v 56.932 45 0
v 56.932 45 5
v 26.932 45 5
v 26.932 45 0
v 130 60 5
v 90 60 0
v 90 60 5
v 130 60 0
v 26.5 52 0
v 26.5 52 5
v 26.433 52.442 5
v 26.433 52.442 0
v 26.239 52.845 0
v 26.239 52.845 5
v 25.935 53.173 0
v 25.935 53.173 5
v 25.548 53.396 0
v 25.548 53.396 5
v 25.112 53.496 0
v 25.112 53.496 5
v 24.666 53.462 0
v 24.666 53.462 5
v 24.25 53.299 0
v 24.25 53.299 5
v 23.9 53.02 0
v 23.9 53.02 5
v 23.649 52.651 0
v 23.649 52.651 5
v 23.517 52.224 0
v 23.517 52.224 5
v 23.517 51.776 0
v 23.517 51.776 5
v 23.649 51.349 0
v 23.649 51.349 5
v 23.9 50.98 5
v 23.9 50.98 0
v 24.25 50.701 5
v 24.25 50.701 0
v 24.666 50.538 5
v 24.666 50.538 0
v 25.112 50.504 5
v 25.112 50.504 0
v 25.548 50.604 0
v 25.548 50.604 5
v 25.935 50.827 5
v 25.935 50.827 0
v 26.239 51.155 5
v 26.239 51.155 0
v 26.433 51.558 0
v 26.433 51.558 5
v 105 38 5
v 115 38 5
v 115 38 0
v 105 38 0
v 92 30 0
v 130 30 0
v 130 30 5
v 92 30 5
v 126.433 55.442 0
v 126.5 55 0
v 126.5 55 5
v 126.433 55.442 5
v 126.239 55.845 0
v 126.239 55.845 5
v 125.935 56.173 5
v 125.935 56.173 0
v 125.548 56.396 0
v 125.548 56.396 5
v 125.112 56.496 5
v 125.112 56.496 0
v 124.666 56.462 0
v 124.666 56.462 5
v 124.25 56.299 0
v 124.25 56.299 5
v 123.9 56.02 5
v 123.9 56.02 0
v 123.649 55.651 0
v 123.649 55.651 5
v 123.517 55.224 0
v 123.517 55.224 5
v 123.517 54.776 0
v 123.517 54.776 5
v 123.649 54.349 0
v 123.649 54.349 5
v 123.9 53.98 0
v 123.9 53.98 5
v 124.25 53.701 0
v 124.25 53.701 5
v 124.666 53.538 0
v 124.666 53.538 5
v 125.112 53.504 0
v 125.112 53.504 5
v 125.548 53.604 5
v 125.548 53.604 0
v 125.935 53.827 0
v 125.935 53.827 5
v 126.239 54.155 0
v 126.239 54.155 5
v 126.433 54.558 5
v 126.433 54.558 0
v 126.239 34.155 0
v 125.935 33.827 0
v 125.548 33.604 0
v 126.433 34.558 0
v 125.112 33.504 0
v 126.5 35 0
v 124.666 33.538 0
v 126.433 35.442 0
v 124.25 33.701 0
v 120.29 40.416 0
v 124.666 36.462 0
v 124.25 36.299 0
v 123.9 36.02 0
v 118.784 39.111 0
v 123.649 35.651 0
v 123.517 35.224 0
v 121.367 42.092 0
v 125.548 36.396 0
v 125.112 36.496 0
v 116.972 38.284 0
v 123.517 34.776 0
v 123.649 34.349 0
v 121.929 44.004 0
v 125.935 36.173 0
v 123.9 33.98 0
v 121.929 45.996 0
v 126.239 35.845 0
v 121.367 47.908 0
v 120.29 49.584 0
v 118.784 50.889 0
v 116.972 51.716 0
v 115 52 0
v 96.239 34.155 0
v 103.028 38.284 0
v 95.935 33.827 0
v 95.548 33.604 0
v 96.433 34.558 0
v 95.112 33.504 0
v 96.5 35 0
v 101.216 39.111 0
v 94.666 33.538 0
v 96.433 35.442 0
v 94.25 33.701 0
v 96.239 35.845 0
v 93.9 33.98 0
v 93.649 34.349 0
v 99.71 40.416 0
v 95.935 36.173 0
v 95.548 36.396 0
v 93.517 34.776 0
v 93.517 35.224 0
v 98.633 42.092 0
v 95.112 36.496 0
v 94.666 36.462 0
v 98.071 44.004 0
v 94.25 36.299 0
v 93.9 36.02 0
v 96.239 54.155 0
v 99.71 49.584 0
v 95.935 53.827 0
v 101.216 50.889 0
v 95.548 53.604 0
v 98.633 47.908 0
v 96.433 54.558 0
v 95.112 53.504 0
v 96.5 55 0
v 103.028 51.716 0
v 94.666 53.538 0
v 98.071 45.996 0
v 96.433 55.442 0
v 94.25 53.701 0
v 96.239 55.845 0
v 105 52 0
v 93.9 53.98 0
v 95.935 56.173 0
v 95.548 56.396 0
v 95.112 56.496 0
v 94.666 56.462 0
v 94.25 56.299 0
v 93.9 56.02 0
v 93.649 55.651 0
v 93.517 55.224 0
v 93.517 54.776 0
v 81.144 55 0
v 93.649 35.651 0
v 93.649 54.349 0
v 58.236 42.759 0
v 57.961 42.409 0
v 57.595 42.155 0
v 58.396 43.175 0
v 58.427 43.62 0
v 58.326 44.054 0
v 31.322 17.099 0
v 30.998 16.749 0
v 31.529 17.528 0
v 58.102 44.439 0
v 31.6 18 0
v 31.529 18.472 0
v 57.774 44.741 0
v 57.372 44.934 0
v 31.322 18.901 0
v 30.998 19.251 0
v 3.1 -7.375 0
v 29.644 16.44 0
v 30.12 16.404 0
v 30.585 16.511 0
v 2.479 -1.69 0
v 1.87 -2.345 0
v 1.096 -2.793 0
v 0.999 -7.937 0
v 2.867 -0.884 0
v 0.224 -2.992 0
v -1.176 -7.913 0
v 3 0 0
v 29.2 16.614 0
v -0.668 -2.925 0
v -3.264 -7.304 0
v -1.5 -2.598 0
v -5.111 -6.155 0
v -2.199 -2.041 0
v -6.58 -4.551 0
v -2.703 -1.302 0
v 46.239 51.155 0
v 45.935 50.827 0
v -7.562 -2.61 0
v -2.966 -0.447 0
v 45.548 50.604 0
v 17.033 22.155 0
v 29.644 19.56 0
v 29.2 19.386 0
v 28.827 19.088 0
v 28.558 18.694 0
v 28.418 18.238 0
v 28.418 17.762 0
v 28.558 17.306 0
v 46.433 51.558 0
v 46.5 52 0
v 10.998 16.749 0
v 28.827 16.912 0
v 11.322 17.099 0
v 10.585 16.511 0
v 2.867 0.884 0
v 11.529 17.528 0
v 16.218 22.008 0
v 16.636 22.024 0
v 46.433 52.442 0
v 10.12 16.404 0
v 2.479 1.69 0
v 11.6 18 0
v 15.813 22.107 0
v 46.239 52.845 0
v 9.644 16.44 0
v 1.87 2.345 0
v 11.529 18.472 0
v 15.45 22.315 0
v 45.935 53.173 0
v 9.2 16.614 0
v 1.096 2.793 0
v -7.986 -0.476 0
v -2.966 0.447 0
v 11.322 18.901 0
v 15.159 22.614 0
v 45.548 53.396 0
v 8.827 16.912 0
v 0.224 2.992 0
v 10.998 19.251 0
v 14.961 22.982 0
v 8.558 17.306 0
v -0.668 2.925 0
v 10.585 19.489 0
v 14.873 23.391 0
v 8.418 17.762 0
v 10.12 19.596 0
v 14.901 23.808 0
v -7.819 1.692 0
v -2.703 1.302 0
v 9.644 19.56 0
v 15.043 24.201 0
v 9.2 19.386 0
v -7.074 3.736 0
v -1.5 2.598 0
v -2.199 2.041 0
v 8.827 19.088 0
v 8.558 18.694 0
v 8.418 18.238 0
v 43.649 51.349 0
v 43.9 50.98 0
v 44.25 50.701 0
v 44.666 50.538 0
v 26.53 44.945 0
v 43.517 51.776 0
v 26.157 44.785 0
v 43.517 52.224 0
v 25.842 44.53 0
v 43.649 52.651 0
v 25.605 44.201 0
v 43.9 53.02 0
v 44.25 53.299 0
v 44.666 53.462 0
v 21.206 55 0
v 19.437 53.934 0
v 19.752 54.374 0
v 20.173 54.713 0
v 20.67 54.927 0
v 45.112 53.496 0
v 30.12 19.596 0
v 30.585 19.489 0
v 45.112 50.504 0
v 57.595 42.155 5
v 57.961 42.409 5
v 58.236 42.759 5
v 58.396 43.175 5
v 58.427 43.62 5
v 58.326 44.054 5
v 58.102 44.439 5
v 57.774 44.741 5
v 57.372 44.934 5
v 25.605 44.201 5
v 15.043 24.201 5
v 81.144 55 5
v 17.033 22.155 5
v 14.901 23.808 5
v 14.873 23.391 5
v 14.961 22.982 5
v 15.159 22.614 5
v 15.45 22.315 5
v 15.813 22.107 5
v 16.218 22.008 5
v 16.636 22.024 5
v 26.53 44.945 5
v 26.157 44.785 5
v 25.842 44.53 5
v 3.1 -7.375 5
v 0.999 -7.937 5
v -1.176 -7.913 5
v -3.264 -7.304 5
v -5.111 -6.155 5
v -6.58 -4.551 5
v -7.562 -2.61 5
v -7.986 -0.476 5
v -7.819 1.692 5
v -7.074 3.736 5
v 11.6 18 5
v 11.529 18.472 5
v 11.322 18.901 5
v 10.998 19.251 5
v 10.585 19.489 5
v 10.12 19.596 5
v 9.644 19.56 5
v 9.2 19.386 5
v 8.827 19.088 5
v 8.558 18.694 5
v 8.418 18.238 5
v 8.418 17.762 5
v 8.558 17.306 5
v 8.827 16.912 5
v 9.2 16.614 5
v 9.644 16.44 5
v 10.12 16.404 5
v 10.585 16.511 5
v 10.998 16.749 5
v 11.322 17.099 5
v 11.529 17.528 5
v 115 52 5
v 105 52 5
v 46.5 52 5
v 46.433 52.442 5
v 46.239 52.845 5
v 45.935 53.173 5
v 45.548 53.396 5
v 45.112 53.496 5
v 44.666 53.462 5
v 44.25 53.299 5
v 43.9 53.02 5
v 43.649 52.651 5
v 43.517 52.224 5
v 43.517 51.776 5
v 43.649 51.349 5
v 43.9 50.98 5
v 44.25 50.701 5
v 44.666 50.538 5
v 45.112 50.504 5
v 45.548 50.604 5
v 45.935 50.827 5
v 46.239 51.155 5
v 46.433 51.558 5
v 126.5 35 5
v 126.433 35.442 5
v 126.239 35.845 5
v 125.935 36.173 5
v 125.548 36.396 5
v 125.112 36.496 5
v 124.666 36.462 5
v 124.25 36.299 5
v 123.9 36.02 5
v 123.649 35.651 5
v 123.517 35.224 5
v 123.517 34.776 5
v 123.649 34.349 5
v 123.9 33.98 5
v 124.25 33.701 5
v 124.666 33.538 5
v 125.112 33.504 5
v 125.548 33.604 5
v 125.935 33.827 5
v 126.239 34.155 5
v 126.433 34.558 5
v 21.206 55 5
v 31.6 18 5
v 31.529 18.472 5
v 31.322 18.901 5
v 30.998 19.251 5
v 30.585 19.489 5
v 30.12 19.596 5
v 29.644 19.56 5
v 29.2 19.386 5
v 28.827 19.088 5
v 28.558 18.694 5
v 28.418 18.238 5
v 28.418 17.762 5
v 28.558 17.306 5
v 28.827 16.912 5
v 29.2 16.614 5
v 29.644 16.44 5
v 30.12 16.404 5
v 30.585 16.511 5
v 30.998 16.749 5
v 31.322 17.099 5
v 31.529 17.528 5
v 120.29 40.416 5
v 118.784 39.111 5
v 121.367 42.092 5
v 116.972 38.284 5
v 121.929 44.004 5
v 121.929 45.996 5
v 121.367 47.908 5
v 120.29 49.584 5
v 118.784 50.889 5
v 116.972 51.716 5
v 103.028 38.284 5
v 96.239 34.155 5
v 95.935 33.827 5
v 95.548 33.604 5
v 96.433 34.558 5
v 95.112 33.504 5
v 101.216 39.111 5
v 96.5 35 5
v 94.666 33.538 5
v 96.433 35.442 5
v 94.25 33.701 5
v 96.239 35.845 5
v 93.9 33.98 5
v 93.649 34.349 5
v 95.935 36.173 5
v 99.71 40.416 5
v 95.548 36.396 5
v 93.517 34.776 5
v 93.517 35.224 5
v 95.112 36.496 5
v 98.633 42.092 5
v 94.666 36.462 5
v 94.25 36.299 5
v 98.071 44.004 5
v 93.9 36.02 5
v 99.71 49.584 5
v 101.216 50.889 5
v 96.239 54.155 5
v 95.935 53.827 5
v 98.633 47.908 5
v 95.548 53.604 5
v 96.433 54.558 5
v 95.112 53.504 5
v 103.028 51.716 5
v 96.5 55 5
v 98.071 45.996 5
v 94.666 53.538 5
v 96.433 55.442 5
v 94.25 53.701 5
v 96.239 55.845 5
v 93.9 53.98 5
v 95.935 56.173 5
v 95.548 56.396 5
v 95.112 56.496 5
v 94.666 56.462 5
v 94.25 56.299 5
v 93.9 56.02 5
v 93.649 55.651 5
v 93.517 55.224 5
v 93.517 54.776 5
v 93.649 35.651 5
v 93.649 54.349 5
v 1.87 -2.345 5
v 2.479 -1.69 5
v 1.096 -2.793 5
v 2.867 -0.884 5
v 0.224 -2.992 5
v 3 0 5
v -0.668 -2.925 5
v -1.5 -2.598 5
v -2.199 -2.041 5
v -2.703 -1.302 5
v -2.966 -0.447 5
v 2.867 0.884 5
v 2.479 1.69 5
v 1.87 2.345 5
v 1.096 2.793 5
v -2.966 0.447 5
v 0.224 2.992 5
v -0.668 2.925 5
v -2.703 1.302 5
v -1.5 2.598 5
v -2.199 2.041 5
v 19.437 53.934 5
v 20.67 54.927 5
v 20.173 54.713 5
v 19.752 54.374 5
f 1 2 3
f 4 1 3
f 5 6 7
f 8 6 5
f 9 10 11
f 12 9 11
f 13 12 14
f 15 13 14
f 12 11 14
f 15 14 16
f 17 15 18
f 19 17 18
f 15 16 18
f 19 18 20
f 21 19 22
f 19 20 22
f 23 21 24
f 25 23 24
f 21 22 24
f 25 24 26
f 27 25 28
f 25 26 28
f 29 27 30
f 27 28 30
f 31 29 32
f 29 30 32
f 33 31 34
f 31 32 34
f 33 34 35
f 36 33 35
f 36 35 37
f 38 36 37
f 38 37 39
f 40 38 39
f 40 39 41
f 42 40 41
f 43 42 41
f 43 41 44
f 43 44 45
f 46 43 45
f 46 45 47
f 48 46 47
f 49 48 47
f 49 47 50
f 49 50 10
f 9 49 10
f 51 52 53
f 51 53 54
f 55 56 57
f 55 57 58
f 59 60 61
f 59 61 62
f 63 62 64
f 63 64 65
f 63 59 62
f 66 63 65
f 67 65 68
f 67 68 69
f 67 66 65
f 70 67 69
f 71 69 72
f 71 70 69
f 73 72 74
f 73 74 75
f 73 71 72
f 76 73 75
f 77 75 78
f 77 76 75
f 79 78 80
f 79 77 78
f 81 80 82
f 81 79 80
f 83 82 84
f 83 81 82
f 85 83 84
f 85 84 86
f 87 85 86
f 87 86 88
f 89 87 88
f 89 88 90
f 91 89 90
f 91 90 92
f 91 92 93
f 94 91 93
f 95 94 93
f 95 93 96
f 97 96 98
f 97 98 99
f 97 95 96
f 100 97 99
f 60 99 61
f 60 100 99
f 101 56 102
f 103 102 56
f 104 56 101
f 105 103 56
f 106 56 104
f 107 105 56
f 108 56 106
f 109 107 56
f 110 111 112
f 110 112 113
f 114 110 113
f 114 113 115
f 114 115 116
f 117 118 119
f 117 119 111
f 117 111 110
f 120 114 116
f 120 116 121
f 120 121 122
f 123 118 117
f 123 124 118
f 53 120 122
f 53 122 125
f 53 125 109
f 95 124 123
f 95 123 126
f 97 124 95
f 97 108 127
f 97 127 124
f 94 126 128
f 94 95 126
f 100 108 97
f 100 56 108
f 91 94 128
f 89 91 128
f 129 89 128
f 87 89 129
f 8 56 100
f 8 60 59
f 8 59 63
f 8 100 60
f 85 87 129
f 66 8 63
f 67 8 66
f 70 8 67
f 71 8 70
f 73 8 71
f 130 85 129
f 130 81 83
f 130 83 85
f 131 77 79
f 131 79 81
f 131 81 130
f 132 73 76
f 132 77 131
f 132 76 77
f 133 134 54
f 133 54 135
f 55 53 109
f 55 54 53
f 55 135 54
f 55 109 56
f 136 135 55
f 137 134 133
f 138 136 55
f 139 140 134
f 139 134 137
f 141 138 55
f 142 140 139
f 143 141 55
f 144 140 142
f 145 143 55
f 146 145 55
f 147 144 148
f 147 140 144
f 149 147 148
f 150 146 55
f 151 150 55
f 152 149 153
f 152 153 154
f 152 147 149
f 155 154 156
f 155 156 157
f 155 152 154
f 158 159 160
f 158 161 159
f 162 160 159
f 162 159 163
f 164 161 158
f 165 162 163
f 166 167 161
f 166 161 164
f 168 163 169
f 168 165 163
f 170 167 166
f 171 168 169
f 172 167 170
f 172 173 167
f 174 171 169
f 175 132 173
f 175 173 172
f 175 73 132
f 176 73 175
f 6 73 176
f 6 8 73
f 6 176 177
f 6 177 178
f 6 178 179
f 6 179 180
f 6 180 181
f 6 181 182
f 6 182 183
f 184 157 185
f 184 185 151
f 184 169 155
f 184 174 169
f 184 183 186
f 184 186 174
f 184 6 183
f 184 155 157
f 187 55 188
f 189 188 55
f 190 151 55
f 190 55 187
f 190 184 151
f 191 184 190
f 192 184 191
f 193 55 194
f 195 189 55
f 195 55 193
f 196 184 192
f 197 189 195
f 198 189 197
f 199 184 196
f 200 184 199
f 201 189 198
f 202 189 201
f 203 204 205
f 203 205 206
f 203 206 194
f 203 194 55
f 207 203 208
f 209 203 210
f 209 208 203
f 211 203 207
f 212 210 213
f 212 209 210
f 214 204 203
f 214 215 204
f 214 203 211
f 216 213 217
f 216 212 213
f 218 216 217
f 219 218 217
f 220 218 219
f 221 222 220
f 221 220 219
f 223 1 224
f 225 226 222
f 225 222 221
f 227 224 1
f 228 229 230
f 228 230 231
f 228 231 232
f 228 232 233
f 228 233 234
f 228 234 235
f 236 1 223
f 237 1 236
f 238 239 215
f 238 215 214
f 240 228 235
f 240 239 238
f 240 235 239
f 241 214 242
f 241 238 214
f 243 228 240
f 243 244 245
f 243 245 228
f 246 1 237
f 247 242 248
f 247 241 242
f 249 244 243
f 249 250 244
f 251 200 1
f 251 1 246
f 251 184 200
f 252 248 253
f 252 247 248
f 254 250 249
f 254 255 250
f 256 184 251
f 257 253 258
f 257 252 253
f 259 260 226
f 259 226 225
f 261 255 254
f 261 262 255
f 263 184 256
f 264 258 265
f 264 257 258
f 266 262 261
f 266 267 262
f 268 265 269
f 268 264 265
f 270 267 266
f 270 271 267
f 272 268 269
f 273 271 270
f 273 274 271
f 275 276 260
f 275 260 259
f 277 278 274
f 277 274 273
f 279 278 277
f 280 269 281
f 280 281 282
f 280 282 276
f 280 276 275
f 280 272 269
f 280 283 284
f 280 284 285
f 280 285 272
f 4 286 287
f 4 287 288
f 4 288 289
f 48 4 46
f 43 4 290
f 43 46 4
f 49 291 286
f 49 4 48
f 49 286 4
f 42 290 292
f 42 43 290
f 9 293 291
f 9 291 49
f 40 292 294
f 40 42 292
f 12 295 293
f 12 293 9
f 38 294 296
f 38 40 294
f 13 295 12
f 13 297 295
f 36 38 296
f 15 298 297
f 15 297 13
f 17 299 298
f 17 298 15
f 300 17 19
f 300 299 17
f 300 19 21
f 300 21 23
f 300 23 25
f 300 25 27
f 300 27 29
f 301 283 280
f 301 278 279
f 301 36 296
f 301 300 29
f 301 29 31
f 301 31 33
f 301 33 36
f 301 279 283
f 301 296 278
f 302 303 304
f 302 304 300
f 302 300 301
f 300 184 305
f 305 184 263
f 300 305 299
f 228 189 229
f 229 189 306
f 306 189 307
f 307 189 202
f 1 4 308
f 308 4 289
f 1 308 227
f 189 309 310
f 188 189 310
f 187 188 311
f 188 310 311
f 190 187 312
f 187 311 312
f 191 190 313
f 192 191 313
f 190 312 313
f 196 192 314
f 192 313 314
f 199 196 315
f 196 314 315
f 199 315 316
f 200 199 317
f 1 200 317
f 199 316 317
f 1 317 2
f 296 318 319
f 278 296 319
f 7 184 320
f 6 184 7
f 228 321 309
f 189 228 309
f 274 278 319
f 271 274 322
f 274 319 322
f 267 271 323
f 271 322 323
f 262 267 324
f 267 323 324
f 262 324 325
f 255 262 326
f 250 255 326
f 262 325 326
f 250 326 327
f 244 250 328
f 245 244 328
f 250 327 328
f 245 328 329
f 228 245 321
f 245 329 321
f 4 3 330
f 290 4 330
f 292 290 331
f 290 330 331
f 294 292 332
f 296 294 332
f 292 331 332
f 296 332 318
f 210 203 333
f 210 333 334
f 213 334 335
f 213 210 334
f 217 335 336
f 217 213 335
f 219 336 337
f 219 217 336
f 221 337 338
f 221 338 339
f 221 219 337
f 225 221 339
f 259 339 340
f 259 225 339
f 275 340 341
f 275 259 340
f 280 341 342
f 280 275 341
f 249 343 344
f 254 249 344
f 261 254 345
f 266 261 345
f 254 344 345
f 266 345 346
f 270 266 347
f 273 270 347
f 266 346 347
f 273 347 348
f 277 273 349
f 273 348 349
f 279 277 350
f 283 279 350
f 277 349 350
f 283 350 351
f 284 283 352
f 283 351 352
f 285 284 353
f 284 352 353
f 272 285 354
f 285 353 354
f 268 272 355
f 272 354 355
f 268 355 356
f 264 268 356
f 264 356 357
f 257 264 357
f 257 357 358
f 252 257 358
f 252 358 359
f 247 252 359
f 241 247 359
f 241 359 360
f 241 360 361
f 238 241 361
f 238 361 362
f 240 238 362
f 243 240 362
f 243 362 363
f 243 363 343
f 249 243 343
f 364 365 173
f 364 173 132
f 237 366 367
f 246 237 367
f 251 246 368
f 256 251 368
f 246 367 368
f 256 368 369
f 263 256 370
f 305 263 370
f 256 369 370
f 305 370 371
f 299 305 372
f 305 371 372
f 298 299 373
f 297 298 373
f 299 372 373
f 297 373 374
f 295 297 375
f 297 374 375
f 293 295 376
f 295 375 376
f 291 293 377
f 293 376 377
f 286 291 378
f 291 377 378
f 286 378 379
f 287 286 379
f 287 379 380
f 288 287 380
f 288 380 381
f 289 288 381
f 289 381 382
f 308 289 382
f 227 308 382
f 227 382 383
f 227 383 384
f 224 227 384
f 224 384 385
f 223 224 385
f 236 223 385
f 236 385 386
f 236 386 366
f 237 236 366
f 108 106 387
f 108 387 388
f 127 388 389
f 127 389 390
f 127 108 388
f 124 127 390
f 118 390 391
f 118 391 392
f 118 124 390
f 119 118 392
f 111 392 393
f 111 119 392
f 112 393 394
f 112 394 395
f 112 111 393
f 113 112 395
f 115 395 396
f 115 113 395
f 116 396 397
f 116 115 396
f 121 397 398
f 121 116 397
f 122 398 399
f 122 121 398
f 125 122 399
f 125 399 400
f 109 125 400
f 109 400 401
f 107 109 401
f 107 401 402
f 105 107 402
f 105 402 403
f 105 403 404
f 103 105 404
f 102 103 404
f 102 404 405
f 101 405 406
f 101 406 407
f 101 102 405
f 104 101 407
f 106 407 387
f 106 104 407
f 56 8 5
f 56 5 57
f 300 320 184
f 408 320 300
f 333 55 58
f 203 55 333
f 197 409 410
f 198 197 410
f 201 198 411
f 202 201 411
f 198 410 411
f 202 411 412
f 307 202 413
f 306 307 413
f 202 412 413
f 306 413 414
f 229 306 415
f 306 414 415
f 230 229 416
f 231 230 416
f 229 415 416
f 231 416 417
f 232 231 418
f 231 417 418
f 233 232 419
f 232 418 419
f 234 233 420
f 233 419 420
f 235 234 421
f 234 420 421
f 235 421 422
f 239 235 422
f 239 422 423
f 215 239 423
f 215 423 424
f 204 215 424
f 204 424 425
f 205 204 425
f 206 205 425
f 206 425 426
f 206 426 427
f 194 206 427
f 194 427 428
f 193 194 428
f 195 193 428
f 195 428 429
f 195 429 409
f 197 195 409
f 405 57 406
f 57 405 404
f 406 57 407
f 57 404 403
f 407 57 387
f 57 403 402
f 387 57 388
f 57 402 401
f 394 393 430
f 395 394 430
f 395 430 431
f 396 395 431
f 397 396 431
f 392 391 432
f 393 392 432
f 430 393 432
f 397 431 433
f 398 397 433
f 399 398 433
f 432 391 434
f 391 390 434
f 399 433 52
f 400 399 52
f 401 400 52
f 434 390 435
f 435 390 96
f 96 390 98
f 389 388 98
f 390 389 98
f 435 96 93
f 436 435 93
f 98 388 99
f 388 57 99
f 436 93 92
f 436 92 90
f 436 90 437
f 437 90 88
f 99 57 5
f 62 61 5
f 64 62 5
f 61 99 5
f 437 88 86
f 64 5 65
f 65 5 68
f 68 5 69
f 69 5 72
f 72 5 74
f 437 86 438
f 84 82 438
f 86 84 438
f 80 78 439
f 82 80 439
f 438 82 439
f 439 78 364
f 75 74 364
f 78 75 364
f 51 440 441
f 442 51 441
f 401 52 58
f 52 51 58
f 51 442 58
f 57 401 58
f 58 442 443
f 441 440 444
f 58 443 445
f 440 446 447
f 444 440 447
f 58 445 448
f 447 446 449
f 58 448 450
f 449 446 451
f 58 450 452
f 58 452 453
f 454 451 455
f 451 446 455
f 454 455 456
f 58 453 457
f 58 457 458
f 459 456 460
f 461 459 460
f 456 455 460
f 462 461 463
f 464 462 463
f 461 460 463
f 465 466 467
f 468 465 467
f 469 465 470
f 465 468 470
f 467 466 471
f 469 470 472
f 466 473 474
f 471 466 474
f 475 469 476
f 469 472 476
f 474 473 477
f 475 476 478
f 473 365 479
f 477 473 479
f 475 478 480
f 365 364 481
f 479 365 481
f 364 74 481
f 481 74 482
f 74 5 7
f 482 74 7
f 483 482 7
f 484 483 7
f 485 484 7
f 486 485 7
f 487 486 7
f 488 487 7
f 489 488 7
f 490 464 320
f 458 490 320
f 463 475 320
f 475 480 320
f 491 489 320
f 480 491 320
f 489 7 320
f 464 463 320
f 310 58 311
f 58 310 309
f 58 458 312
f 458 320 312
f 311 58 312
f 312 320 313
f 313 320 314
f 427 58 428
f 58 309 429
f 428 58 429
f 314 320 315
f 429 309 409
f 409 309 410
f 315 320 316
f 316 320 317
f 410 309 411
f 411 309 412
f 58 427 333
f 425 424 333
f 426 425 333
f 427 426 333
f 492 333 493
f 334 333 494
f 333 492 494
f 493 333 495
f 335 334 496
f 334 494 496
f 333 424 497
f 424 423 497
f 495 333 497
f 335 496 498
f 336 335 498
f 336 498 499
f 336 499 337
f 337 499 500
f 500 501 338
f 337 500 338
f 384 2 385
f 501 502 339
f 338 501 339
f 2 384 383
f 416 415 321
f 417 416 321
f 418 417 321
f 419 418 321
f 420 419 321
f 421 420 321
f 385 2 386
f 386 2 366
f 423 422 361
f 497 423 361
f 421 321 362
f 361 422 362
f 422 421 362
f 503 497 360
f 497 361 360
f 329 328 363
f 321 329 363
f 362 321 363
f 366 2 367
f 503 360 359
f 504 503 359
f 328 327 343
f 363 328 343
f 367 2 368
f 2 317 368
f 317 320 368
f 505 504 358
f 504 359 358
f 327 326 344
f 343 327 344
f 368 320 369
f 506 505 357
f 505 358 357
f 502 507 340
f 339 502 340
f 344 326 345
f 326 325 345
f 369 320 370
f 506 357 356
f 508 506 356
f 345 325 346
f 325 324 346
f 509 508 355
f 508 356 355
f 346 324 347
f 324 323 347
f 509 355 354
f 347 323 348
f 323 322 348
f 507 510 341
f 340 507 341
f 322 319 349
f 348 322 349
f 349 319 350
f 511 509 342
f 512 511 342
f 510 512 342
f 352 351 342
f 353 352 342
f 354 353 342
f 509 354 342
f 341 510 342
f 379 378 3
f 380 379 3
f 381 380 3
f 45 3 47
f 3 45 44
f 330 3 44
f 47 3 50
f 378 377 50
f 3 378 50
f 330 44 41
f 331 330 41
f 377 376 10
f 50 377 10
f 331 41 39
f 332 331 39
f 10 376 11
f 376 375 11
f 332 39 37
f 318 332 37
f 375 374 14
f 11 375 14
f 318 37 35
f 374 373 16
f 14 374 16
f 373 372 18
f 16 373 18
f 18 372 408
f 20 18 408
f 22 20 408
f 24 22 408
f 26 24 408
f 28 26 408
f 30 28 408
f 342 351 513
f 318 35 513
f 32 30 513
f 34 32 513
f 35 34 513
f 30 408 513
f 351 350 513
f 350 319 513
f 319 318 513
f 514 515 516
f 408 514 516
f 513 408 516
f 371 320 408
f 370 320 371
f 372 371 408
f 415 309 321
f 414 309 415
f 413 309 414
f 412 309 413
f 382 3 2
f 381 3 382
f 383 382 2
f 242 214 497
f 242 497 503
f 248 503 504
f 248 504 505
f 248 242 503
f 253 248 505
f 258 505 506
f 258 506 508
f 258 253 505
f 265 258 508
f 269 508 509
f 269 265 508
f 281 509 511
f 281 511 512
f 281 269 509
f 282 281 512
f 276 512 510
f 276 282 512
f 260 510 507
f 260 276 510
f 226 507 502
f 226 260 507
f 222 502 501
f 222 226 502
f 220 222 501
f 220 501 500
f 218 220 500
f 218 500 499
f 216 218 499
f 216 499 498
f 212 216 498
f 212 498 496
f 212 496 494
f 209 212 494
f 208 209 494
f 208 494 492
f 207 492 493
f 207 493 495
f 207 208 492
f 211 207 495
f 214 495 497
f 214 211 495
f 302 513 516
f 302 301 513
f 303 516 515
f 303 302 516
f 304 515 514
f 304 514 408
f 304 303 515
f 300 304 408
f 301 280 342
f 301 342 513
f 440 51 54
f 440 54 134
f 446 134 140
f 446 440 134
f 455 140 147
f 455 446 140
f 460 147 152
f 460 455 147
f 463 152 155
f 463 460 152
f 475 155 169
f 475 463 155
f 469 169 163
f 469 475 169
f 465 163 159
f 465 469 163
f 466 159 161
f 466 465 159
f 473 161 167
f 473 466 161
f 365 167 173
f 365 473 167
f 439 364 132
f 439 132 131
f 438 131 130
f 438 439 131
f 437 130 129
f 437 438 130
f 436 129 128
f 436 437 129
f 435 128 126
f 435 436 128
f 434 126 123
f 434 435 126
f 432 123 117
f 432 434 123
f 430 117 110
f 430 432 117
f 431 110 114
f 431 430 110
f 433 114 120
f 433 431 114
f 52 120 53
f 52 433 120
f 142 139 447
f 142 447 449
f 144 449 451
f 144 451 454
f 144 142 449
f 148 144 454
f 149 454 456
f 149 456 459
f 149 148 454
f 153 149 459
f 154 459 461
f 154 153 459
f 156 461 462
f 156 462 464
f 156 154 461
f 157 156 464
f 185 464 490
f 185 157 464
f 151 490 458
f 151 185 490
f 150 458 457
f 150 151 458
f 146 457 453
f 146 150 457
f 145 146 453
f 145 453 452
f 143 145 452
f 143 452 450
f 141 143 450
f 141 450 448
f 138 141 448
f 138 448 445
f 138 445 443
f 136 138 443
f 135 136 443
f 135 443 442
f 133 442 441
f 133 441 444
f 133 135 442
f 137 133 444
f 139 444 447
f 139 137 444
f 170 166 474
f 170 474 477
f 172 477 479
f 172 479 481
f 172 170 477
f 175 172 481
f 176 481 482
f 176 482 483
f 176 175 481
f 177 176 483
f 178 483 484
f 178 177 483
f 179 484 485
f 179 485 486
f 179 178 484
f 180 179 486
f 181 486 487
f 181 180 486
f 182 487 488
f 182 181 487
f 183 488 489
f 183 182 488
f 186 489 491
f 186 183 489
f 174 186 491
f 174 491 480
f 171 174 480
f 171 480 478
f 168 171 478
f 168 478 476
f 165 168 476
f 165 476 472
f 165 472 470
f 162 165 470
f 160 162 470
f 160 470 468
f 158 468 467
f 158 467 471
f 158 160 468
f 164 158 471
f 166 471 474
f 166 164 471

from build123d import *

# Parameters (mm, degrees)
SKETCH_1_R          = 3
SKETCH_1_R_2        = 1.5
EXTRUDE_1_DEPTH     = 5
EXTRUDE_2_DEPTH     = 5
SKETCH_4_R          = 1.5
CUT_EXTRUDE_1_DEPTH = 144.265487819
EXTRUDE_START       = -5
EXTRUDE_3_DEPTH     = 5
CUT_EXTRUDE_2_DEPTH = 144.265487819
SKETCH_7_R          = 1.6
CUT_EXTRUDE_3_DEPTH = 144.265487819
FILLET_1_R          = 2


with BuildPart() as part:
    # 草图1 → 凸台-拉伸1 (new body)
    with BuildSketch(Plane.XY):
        with BuildLine():
            Line((-3.933140204, 6.966376973), (90, 60))
            Line((90, 60), (130, 60))
            Line((130, 60), (130, 30))
            Line((130, 30), (92, 30))
            Line((92, 30), (3.100465808, -7.374761811))
            ThreePointArc((3.100465808, -7.374761811), (-7.182645896, -3.522725923), (-3.933140204, 6.966376973))
        make_face()
        Circle(SKETCH_1_R, mode=Mode.SUBTRACT)
        with Locations((95, 55)):
            Circle(SKETCH_1_R_2, mode=Mode.SUBTRACT)
        with Locations((125, 55)):
            Circle(SKETCH_1_R_2, mode=Mode.SUBTRACT)
        with Locations((125, 35)):
            Circle(SKETCH_1_R_2, mode=Mode.SUBTRACT)
        with Locations((95, 35)):
            Circle(SKETCH_1_R_2, mode=Mode.SUBTRACT)
    extrude(amount=EXTRUDE_1_DEPTH)

    # 草图3 → 凸台-拉伸2 (add)
    with BuildSketch(Plane.XY.offset(5)):
        Polygon((81.144001216, 55), (20, 55), (20, 20.478766027), align=None)
    extrude(amount=-EXTRUDE_2_DEPTH)

    # 草图4 → 切除-拉伸1 (cut, through all)
    with BuildSketch(Plane.XY.offset(5)):
        with Locations((25, 52)):
            Circle(SKETCH_4_R)
        with Locations((45, 52)):
            Circle(SKETCH_4_R)
    extrude(amount=-CUT_EXTRUDE_1_DEPTH, mode=Mode.SUBTRACT)

    # 草图6 → 凸台-拉伸3 (add)
    with BuildSketch(Plane.XY.offset(5).offset(EXTRUDE_START)):
        with BuildLine():
            Line((-7.074049095, 3.736017853), (20, 55))
            Line((20, 55), (20, 20.478766027))
            Line((20, 20.478766027), (-3.933140204, 6.966376973))
            ThreePointArc((-3.933140204, 6.966376973), (-5.735709118, 5.576884517), (-7.074049095, 3.736017853))
        make_face()
    extrude(amount=EXTRUDE_3_DEPTH)

    # 草图5 → 切除-拉伸2 (cut, through all)
    with BuildSketch(Plane.XY.offset(5)):
        with BuildLine():
            Line((105, 52), (115, 52))
            ThreePointArc((115, 52), (122, 45), (115, 38))
            Line((115, 38), (105, 38))
            ThreePointArc((105, 38), (98, 45), (105, 52))
        make_face()
        with BuildLine():
            Line((25.605401824, 44.200503347), (15.042800964, 24.200503347))
            ThreePointArc((15.042800964, 24.200503347), (15.293877797, 22.454192152), (17.032531201, 22.154647985))
            Line((17.032531201, 22.154647985), (57.595132061, 42.154647985))
            ThreePointArc((57.595132061, 42.154647985), (58.392612512, 43.840567158), (56.93178603, 45))
            Line((56.93178603, 45), (26.93178603, 45))
            ThreePointArc((26.93178603, 45), (26.157433081, 44.784670195), (25.605401824, 44.200503347))
        make_face()
    extrude(amount=-CUT_EXTRUDE_2_DEPTH, mode=Mode.SUBTRACT)

    # 草图7 → 切除-拉伸3 (cut, through all)
    with BuildSketch(Plane.XY.offset(5)):
        with Locations((10, 18)):
            Circle(SKETCH_7_R)
        with Locations((30, 18)):
            Circle(SKETCH_7_R)
    extrude(amount=-CUT_EXTRUDE_3_DEPTH, mode=Mode.SUBTRACT)

    # 圆角1
    fillet_1_edges = [part.edges().sort_by_distance(p)[0] for p in [
        (20, 55, 2.5),
    ]]
    fillet(fillet_1_edges, radius=FILLET_1_R)


solid = part.part
